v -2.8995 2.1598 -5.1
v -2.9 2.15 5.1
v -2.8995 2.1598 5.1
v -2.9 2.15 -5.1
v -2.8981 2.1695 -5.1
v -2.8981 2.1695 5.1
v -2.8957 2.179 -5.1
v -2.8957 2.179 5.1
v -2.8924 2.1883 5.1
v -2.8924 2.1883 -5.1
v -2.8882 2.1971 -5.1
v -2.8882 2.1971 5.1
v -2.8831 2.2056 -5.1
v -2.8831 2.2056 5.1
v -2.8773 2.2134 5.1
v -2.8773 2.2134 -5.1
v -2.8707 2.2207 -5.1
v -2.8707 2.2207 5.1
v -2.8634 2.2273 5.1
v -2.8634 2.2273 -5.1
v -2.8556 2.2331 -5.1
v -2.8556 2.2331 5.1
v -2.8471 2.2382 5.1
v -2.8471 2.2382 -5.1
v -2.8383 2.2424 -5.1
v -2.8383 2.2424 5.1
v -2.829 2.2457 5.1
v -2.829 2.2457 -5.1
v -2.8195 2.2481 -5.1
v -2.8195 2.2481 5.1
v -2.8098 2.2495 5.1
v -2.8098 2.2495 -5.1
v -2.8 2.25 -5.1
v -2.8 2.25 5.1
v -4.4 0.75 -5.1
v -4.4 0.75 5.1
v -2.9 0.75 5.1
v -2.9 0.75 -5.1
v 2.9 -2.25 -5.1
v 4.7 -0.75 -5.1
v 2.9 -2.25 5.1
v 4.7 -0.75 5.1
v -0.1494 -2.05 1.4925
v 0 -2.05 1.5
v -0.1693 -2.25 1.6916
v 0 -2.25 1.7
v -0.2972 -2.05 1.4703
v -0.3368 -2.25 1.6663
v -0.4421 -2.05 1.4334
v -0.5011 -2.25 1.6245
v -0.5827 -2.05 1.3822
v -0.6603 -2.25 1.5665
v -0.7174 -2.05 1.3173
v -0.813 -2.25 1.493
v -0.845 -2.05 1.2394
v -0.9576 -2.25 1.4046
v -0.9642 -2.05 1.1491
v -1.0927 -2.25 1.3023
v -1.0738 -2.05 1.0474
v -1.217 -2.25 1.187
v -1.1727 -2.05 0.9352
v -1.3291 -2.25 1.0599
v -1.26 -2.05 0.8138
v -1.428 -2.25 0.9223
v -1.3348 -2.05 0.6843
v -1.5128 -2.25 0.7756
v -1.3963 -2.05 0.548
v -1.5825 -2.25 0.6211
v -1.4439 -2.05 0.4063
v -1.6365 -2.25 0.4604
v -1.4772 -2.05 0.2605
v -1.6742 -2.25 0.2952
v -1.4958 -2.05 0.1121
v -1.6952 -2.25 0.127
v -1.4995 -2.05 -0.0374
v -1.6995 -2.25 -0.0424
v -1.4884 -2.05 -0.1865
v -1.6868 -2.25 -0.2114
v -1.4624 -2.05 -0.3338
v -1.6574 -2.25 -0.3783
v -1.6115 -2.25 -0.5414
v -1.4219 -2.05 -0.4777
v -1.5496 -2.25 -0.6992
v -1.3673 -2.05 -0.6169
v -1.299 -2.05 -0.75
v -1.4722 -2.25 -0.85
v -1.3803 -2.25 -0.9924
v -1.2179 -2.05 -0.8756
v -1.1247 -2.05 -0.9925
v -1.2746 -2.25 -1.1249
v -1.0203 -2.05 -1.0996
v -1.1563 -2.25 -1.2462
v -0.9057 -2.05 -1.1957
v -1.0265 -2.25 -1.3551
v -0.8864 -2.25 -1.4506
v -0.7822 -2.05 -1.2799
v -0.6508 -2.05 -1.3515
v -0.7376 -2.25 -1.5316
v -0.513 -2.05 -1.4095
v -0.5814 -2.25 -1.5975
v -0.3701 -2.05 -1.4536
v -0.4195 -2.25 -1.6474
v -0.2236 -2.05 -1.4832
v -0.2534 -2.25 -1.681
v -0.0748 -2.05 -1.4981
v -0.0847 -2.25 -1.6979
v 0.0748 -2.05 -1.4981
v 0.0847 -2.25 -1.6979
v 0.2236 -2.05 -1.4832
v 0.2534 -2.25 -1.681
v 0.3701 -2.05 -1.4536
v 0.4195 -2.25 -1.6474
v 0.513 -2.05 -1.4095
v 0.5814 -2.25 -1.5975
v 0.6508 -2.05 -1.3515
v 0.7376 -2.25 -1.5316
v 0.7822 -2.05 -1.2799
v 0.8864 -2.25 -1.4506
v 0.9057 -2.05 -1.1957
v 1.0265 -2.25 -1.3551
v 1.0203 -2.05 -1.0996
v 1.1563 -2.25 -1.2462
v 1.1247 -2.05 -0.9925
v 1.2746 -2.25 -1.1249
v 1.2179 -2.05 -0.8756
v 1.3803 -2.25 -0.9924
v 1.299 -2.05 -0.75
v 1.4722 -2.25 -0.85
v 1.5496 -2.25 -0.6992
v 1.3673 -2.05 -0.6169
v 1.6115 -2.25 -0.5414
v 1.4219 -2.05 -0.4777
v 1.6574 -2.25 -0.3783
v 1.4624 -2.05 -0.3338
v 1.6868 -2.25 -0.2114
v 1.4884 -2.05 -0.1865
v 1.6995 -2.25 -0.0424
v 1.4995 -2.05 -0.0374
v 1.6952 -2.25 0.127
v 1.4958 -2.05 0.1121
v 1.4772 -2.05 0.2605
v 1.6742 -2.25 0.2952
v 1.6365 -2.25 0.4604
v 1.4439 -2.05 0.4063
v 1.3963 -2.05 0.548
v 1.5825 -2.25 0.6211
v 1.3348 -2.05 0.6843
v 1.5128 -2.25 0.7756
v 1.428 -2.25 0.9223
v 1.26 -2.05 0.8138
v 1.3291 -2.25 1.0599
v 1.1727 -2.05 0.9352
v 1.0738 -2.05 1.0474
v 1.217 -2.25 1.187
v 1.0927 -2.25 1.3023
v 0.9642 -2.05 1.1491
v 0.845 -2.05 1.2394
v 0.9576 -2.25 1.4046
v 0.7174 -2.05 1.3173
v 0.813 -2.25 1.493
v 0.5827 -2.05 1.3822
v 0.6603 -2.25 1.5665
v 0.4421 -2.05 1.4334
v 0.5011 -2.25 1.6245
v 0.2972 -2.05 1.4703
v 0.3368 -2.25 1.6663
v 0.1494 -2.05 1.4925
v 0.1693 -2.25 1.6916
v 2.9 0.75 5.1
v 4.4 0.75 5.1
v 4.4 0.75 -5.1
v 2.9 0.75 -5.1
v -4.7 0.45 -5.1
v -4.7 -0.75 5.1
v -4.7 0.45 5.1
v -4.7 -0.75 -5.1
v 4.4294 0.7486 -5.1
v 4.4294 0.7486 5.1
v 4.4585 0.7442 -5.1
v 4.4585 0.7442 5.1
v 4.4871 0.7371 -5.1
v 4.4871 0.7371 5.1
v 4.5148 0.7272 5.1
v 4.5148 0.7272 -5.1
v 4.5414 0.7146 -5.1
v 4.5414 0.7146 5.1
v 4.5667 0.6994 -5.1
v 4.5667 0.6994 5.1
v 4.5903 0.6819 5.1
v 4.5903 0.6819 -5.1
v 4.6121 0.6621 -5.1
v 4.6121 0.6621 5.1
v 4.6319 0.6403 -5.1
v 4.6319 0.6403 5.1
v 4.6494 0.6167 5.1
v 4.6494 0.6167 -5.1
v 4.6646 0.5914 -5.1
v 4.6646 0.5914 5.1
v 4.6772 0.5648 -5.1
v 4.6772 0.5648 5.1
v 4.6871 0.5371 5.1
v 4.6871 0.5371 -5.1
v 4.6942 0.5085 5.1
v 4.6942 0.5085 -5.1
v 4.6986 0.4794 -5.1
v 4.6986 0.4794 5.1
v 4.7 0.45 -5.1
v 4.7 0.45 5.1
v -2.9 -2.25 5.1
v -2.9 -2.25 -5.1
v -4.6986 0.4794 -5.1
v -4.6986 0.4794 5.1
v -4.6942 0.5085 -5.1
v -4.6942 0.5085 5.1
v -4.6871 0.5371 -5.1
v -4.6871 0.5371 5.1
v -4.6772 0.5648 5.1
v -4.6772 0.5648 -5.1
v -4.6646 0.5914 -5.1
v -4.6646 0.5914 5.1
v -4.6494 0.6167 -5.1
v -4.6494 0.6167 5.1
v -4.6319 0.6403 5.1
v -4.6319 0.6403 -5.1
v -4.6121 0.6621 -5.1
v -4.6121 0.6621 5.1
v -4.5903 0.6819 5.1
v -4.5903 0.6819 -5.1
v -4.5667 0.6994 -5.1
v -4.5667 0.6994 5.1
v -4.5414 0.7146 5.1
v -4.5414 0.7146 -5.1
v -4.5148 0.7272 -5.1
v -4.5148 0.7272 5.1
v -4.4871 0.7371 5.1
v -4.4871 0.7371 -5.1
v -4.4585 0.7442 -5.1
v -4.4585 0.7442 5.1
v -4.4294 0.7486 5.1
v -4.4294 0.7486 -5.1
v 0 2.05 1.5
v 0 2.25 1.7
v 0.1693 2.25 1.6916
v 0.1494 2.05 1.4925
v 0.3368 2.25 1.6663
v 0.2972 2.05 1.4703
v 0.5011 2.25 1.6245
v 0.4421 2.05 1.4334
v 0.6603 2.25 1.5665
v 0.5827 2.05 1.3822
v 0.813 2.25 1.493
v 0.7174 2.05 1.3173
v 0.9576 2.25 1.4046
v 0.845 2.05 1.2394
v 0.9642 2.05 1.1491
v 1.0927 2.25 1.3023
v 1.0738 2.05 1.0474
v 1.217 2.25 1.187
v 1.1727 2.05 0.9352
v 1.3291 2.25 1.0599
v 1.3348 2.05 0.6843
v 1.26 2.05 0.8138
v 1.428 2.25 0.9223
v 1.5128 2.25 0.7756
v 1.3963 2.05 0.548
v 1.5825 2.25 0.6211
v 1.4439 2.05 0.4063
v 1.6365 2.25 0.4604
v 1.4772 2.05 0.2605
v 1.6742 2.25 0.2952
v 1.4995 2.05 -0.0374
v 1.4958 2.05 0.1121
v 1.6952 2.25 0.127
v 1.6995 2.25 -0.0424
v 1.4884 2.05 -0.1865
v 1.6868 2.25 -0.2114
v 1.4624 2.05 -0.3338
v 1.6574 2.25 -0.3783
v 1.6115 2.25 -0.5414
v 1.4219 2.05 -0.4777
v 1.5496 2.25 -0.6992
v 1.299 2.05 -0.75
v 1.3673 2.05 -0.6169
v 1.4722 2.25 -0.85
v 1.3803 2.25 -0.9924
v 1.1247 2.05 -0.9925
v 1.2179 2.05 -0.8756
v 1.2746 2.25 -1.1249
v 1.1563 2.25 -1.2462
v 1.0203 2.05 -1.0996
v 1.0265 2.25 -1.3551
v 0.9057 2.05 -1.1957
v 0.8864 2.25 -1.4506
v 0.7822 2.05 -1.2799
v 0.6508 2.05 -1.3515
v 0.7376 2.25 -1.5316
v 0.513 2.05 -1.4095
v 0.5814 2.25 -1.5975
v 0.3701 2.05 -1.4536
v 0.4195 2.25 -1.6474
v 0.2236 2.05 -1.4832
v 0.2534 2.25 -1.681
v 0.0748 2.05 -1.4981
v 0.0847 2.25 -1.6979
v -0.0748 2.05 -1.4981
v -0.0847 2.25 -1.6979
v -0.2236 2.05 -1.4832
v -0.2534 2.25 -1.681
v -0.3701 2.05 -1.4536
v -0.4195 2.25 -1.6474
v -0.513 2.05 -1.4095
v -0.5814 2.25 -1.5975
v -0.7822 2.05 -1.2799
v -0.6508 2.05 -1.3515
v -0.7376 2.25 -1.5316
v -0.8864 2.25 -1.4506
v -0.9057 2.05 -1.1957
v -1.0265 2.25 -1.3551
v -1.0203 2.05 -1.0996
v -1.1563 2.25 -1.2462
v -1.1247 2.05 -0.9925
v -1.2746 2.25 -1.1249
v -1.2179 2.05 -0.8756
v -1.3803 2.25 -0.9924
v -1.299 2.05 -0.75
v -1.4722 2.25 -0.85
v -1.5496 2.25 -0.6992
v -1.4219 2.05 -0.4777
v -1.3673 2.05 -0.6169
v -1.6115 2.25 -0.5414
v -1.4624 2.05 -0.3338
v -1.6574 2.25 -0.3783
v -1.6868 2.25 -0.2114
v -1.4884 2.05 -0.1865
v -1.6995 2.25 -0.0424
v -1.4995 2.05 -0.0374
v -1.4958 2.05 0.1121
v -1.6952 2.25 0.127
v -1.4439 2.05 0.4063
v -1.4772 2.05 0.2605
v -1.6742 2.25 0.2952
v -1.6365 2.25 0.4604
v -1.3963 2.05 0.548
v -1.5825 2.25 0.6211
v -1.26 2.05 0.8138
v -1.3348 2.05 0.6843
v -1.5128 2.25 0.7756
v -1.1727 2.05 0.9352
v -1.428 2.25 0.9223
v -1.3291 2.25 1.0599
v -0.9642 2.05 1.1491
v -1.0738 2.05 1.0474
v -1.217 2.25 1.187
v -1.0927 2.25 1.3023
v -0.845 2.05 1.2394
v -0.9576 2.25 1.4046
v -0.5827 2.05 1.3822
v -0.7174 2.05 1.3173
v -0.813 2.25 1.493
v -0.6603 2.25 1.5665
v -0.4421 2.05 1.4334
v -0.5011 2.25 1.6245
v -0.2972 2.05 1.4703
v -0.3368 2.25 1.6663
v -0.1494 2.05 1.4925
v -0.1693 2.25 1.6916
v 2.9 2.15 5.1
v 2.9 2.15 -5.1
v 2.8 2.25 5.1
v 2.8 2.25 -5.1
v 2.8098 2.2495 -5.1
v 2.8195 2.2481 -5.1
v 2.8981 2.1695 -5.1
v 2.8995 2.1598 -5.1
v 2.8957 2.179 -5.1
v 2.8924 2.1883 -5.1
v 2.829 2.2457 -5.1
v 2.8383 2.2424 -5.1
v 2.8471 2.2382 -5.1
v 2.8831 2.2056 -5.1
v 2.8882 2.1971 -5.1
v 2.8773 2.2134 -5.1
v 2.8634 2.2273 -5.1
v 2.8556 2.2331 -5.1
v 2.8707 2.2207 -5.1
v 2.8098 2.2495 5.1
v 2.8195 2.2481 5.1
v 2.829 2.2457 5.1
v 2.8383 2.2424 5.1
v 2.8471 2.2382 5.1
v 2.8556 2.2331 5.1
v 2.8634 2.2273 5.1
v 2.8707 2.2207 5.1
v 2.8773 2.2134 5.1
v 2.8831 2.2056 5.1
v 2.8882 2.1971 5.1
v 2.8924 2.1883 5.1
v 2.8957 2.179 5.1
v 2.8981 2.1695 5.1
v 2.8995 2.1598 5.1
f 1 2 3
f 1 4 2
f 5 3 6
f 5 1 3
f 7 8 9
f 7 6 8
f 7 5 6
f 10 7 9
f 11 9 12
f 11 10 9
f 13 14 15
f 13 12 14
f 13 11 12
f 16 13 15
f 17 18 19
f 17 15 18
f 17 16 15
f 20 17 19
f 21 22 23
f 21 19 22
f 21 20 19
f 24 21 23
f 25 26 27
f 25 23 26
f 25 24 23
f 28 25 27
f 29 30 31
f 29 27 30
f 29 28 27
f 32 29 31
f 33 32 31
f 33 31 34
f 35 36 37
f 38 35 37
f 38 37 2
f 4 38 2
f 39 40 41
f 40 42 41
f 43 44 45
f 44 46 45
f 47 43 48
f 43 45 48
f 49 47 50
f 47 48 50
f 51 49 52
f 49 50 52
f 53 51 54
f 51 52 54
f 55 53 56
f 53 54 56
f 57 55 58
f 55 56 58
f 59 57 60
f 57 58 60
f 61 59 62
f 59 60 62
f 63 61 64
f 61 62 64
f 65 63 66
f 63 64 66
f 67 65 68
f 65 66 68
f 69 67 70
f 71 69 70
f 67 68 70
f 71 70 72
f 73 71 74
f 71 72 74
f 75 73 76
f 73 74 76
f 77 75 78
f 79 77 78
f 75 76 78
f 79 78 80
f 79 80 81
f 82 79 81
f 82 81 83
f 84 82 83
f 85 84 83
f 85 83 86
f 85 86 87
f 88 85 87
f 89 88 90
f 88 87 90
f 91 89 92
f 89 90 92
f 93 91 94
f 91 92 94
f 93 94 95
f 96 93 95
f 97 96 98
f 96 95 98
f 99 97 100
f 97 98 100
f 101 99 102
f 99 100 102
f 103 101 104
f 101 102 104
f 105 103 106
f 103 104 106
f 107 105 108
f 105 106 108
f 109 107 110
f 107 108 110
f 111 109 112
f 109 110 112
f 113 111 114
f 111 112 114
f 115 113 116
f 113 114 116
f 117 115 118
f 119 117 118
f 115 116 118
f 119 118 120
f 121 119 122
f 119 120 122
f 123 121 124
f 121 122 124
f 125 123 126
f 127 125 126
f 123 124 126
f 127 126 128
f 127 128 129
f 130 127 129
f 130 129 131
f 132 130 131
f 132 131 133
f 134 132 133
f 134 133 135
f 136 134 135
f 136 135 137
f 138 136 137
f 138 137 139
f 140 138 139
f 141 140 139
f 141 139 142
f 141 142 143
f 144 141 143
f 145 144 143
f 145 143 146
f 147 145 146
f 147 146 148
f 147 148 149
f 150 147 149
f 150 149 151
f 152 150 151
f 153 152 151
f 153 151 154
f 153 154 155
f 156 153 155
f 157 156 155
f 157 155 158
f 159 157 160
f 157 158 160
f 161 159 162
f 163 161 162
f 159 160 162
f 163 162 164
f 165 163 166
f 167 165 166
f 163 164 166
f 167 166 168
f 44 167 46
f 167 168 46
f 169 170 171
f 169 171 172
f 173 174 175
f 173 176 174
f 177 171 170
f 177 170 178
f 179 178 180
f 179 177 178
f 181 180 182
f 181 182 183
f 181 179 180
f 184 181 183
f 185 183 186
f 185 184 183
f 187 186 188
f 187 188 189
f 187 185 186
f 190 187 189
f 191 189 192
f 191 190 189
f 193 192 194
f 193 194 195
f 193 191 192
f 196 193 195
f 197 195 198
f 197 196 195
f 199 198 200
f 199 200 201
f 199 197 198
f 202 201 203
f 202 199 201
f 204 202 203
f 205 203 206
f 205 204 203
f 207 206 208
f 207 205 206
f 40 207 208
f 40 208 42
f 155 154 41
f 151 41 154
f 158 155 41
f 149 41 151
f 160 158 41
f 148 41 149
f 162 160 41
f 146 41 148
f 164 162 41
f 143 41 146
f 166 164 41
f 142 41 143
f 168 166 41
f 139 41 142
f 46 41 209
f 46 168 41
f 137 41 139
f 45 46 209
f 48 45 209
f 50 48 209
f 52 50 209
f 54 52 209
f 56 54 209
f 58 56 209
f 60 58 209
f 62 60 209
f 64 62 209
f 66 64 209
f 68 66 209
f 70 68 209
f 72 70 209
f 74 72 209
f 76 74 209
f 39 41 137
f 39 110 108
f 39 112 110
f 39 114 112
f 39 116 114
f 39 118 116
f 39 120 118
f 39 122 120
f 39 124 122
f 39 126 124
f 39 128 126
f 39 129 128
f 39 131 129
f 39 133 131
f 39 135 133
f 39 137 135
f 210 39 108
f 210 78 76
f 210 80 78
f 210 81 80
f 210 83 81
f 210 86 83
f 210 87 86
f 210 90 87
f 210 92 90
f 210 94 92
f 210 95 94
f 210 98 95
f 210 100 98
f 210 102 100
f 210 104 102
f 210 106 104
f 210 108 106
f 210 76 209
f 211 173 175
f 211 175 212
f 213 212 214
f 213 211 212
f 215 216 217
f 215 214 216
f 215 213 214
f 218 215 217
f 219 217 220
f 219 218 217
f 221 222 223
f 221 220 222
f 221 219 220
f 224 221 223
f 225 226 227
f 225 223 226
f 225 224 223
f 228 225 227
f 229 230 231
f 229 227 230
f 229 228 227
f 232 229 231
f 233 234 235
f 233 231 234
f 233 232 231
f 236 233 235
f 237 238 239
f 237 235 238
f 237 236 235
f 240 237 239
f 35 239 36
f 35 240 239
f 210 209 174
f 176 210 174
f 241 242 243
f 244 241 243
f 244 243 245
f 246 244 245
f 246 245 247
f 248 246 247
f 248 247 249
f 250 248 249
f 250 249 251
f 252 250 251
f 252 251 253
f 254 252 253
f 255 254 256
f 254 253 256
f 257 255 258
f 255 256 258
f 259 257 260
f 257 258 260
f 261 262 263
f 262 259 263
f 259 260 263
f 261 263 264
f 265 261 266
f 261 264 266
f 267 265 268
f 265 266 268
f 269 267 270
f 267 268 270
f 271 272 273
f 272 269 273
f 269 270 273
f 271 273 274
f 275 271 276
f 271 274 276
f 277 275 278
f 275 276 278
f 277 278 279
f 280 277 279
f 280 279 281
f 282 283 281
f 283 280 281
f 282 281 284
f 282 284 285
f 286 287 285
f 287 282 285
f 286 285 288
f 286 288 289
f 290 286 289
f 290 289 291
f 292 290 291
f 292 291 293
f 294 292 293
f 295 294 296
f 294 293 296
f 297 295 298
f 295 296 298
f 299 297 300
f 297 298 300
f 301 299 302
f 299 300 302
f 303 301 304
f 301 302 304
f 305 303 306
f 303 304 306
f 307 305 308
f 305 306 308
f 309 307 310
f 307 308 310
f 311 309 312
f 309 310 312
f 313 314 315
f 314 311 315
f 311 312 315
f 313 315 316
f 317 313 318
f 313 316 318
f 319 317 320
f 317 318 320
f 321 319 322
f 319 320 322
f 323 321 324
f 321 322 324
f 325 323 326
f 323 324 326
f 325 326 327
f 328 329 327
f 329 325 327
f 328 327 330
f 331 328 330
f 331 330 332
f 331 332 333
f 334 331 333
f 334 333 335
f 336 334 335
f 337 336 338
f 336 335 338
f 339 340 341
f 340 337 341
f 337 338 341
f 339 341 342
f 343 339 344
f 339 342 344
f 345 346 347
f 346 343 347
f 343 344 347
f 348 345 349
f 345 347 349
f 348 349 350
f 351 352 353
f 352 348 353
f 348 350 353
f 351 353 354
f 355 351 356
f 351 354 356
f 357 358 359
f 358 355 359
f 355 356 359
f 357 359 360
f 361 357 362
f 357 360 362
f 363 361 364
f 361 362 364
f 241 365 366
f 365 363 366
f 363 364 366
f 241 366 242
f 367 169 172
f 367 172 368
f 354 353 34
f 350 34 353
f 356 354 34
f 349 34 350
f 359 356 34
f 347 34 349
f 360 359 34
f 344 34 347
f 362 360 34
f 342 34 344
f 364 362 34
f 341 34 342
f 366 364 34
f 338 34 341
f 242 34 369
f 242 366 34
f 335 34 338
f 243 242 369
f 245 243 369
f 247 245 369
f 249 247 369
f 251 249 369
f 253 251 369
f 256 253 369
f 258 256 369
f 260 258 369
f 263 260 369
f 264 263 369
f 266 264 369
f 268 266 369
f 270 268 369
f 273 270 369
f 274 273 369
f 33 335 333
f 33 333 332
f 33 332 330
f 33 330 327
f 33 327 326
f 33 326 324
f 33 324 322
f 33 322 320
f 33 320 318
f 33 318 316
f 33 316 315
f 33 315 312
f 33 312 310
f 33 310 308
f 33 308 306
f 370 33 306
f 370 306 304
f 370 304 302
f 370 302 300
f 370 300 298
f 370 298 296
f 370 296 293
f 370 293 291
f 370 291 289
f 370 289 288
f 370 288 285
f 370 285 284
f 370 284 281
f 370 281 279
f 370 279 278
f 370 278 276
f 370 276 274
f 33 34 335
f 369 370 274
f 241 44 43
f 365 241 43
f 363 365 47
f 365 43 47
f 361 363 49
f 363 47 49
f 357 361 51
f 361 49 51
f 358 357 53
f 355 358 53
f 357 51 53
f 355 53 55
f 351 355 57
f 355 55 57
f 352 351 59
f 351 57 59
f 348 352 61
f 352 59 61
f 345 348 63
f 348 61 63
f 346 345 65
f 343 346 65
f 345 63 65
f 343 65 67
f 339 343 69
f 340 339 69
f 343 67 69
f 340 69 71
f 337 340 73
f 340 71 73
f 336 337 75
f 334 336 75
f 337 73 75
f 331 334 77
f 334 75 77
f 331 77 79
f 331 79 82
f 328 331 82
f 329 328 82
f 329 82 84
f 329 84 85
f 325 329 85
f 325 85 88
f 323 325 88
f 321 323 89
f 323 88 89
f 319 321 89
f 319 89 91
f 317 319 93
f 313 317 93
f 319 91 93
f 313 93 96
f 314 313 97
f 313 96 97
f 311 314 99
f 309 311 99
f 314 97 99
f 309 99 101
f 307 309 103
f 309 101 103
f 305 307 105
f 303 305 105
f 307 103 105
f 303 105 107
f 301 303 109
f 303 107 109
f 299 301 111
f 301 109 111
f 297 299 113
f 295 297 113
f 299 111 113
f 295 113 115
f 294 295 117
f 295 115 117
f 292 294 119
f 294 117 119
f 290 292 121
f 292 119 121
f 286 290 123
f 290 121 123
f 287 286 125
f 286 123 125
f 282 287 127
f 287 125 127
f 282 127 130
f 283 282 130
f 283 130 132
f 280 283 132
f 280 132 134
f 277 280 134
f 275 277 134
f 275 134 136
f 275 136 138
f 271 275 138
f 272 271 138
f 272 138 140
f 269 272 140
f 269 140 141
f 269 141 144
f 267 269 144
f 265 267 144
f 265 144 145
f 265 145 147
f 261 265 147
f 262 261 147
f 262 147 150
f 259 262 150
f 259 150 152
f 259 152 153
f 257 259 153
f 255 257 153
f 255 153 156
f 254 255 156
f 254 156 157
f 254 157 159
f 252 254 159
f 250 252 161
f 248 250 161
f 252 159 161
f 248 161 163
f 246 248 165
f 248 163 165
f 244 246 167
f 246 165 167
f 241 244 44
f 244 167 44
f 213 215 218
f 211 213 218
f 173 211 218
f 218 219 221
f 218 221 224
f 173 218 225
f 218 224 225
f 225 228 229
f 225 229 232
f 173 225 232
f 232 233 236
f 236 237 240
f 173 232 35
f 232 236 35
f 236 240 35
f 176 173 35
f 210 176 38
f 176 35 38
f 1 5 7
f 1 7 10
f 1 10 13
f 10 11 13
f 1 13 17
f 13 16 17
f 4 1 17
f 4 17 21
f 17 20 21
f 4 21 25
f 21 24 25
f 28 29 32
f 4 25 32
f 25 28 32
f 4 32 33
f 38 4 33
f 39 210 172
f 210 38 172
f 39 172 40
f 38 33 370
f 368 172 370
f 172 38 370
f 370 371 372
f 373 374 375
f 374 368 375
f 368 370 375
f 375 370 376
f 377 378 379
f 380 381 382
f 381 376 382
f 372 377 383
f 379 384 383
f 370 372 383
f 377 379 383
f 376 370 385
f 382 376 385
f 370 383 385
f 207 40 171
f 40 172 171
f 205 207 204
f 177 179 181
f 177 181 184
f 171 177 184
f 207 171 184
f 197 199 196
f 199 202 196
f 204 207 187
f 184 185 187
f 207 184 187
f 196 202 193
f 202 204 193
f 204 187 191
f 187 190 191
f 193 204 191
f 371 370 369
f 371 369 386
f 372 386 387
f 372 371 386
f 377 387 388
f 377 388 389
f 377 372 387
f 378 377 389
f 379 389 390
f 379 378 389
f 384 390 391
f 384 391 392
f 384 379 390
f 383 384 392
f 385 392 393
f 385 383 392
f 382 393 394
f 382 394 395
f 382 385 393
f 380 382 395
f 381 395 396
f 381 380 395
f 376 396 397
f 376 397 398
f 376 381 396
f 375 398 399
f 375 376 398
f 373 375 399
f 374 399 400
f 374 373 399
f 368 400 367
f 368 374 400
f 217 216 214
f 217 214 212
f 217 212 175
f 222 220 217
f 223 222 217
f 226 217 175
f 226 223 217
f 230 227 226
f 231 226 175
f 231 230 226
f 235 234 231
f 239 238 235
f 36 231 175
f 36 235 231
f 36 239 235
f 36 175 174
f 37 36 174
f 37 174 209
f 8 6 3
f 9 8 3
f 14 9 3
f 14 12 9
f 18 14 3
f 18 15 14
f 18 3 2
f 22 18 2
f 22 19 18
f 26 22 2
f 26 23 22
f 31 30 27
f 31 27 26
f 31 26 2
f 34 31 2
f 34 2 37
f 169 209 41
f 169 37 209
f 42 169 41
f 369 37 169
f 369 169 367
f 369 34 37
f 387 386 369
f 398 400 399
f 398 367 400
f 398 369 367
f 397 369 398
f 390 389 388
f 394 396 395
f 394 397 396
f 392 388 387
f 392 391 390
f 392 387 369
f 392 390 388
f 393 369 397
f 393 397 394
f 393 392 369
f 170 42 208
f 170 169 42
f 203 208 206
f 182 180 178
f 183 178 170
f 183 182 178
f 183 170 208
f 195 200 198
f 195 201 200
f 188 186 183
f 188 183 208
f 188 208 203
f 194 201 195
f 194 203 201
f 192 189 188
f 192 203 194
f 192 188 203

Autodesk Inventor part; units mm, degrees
ref_plane "YZ Plane" through (0, 0, 0) normal (1, 0, 0) x (0, 1, 0)
ref_plane "XZ Plane" through (0, 0, 0) normal (0, 1, 0) x (-1, 0, 0)
ref_plane "XY Plane" through (0, 0, 0) normal (0, 0, 1) x (1, 0, 0)
sketch "Эскиз1" plane through (0, 0, 0) normal (0, 0, 1) x (1, 0, 0)
  line L0 (-4.7, 2.25) -> (4.7, 2.25)
  line L1 (4.7, 2.25) -> (4.7, -2.25)
  line L2 (4.7, -2.25) -> (-4.7, -2.25)
  line L3 (-4.7, -2.25) -> (-4.7, 2.25)
  point P0 (0, 0)
  point P1 (-4.7, 0)
  point P2 (0, 2.25)
  dimension "d0" = 9.4
  dimension "d1" = 4.5
extrude "Выдавливание1" add sketch "Эскиз1" along normal mid plane 10.2
sketch "Эскиз3" plane through (0, 0, 5.1) normal (0, 0, 1) x (1, 0, 0)
  line L0 (-4.7, 2.25) -> (-4.7, -2.25) projected
  line L1 (-4.7, 0.75) -> (-2.9, 0.75)
  line L2 (-2.9, 0.75) -> (-2.9, 2.25)
  line L3 (4.7, 2.25) -> (-4.7, 2.25) projected
  line L4 (4.7, -2.25) -> (4.7, 2.25) projected
  line L5 (4.7, 0.75) -> (2.9, 0.75)
  line L6 (2.9, 0.75) -> (2.9, 2.25)
  point P0 (0, 0)
  dimension "d7" = 1.5
  dimension "d8" = 2.9
  dimension "d9" = 5.8
extrude "Выдавливание2" cut sketch "Эскиз3" against normal blind 10.2
sketch "Эскиз5" plane through (0, 0, 5.1) normal (0, 0, 1) x (1, 0, 0)
  line L0 (-4.7, -2.25) -> (4.7, -2.25) projected
  line L1 (-2.9, -2.25) -> (-4.7, -0.75)
  line L2 (-4.7, 0.75) -> (-4.7, -2.25) projected
  line L3 (4.7, -2.25) -> (4.7, 0.75) projected
  line L4 (4.7, -0.75) -> (2.9, -2.25)
  point P0 (0, 0)
  dimension "d15" = 1.5
  dimension "d16" = 2.9
  dimension "d17" = 5.8
extrude "Выдавливание3" cut sketch "Эскиз5" against normal blind 10.2
sketch "Эскиз6" plane through (-2.9, 2.25, -5.1) normal (0, 1, 0) x (1, 0, 0)
  point P0 (2.9, -5.1)
  point P1 (2.9, -5.1)
hole "Отверстие1" at (0, 2.25, 0) direction (0, -1, 0) diameter 3 end through all
chamfer "Фаска1" distance 0.2 angle 45 2 edges at (0, 2.25, -1.5) (0, -2.25, -1.5)
fillet "Сопряжение2" radius 0.1 2 edges at (2.9, 2.25, 0) (-2.9, 2.25, 0)
fillet "Сопряжение3" radius 0.3 2 edges at (-4.7, 0.75, 0) (4.7, 0.75, 0)
thread "Резьба2" size "M3x0.35" class "6H" standard "ANSI Metric M Profile" full length
properties part number "APM5N" material "Сталь"
